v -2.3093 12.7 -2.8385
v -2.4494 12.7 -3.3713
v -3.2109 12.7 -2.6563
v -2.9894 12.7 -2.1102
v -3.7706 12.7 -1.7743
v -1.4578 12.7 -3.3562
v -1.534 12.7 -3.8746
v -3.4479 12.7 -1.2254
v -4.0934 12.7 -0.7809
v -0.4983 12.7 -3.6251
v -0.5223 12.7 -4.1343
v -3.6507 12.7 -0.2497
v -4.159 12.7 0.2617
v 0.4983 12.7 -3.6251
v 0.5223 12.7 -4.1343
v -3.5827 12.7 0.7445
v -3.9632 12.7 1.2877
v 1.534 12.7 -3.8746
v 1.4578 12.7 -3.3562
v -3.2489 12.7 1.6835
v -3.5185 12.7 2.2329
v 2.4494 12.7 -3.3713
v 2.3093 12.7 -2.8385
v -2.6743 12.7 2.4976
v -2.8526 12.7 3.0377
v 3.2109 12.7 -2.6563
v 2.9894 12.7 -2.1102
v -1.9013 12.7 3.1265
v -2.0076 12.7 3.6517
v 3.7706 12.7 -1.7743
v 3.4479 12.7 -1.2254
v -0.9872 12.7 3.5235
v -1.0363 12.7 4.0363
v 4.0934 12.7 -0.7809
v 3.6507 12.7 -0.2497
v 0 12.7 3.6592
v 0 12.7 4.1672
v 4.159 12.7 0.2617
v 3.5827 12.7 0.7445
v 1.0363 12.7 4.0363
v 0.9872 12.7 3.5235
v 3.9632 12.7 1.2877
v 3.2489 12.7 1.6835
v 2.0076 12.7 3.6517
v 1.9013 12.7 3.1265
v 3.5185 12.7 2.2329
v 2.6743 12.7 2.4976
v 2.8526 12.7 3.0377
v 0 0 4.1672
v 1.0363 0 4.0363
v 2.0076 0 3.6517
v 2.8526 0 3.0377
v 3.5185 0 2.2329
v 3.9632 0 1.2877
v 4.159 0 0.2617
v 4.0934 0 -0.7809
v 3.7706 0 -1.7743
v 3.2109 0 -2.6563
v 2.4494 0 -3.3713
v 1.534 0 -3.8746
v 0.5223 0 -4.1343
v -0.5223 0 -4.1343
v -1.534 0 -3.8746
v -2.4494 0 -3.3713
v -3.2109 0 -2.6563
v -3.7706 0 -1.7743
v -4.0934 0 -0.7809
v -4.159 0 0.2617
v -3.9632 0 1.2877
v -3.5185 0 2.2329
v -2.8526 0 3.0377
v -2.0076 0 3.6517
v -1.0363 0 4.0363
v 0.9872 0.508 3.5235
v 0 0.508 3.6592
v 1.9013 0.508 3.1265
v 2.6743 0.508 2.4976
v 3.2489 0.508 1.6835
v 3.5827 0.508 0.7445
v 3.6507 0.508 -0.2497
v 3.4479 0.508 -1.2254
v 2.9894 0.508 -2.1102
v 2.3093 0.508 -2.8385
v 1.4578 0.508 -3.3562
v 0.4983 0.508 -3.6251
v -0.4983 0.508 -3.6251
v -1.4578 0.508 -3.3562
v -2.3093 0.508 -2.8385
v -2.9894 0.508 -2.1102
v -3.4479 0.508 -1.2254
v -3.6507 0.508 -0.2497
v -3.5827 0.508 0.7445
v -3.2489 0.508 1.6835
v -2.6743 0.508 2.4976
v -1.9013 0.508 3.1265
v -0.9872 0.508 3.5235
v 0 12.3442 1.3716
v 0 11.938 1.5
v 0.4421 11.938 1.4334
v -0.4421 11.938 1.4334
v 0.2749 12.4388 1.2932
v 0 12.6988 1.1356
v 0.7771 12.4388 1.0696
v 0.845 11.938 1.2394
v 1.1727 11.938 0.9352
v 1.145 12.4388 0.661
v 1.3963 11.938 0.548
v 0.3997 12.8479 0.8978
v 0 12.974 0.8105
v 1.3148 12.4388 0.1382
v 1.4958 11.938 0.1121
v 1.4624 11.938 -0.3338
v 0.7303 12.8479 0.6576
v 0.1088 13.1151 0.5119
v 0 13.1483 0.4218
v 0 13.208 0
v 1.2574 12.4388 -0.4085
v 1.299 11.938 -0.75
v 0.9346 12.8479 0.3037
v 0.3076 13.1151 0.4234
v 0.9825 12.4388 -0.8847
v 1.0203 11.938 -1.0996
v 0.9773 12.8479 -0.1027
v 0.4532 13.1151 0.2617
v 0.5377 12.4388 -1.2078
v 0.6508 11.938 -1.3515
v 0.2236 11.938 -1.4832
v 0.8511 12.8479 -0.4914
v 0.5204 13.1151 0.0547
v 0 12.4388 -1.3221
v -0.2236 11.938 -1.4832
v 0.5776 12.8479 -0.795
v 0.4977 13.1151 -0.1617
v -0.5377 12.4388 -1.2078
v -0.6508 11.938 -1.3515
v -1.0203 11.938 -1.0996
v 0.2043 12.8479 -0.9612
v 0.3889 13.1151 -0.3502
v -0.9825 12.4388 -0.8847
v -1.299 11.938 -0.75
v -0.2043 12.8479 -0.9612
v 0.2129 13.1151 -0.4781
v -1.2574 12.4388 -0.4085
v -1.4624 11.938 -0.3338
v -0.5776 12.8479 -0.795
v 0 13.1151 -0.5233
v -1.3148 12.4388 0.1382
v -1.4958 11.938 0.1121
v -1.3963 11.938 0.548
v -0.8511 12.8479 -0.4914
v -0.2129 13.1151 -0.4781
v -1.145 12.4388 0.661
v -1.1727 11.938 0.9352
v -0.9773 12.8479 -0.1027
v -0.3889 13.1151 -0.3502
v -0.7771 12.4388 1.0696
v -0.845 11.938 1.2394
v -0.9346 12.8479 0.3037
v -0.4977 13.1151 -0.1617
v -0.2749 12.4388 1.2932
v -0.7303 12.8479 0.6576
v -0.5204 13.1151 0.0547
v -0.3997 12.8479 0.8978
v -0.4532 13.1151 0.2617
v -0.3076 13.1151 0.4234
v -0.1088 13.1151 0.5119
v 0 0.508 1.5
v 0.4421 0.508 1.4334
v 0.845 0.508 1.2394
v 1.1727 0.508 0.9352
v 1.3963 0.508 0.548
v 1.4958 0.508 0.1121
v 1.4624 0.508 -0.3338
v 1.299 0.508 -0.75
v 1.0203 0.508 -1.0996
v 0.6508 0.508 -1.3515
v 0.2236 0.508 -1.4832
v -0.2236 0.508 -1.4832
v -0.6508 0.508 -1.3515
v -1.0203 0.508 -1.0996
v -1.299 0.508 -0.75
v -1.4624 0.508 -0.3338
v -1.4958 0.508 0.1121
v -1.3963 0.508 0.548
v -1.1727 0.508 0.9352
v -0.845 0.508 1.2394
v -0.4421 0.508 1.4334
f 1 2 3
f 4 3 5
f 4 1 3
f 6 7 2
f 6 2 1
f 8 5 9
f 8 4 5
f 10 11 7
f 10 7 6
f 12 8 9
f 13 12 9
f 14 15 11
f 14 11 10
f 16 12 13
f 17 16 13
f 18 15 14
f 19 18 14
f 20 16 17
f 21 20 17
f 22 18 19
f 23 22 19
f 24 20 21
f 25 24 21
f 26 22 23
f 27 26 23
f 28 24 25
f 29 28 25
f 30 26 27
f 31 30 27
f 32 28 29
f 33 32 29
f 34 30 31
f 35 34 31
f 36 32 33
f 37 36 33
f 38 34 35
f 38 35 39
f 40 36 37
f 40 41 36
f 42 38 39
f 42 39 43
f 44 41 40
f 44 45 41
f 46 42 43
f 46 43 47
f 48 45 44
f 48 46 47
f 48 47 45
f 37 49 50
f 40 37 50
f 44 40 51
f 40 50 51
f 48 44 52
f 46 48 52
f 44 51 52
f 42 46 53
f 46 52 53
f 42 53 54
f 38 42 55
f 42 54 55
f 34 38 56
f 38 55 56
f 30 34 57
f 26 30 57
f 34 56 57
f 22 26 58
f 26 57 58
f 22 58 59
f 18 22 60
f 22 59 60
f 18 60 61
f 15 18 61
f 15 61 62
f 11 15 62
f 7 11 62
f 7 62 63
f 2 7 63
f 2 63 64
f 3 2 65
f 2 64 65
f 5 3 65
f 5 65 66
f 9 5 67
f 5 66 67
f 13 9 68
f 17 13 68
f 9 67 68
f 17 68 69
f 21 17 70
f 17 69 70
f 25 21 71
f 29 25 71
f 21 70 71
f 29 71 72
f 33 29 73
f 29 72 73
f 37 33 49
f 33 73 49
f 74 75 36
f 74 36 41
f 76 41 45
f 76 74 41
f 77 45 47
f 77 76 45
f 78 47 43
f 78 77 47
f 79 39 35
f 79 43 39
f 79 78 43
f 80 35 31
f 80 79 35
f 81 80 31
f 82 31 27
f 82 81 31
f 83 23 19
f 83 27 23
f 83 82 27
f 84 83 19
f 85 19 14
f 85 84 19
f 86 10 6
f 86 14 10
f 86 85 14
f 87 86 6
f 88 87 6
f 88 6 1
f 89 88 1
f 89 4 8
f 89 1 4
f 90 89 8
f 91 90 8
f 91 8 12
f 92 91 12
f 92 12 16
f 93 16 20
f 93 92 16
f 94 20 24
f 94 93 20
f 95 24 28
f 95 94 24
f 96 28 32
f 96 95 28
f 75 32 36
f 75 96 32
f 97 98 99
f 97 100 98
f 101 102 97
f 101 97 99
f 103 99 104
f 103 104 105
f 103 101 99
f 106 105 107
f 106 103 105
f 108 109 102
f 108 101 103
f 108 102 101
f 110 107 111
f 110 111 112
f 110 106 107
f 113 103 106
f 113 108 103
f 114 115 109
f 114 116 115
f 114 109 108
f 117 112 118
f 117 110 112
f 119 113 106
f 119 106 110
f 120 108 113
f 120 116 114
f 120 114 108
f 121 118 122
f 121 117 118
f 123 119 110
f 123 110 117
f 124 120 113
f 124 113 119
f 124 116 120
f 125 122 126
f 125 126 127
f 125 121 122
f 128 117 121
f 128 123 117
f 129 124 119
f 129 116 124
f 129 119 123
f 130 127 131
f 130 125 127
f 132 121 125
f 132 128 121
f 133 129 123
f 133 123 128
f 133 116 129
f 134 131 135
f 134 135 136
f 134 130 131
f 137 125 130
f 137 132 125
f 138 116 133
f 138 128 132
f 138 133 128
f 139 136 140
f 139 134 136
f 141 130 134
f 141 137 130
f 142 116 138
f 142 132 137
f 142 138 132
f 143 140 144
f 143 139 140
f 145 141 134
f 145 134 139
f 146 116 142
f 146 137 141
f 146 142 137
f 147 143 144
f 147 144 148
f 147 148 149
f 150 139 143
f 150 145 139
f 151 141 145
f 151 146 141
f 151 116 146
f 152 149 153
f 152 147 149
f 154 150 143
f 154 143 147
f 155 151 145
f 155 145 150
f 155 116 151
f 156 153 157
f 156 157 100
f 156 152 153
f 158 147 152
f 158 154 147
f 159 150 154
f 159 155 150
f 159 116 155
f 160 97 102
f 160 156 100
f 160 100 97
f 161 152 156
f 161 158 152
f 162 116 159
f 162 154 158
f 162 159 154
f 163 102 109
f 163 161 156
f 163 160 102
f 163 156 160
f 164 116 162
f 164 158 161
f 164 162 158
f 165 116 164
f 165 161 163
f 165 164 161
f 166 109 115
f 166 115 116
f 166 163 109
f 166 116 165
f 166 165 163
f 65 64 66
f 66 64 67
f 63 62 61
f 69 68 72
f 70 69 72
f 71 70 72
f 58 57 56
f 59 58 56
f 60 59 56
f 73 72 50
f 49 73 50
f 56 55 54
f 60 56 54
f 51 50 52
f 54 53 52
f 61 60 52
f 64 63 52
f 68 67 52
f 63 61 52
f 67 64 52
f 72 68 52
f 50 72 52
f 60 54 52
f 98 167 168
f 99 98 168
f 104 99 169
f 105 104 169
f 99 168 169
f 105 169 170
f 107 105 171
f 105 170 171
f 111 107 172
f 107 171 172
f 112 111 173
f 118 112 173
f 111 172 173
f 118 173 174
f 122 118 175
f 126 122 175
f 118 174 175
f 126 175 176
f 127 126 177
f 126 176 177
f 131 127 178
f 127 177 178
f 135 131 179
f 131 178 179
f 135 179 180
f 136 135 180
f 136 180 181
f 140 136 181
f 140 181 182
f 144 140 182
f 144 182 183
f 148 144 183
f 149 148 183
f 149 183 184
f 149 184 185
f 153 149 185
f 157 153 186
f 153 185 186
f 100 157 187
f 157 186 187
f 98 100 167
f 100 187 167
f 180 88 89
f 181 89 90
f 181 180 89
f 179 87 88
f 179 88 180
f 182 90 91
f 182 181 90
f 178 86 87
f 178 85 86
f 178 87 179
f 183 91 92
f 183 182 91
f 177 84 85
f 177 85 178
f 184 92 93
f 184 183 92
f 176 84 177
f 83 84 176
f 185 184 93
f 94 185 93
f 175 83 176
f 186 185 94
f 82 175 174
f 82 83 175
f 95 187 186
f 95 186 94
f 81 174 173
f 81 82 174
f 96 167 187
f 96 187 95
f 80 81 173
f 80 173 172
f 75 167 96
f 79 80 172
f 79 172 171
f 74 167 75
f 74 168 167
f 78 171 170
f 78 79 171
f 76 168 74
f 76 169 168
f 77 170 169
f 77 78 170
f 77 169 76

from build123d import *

# Parameters (mm, degrees)
SKETCH1_R           = 4.1671875
BOSS_EXTRUDE1_DEPTH = 12.7
SHELL1_T            = -0.508
SKETCH2_R           = 1.5
BOSS_EXTRUDE2_DEPTH = 11.43
DOME1_FACE_RADIUS   = 1.5
DOME1_HEIGHT        = 1.27


with BuildPart() as part:
    # Sketch1 → Boss-Extrude1 (new body)
    with BuildSketch(Plane(origin=(0, 0, 0), x_dir=(1, 0, 0), z_dir=(0, 1, 0))):
        with Locations(Location((0, 0, 0), (0, 0, 270))):
            Circle(SKETCH1_R)
    extrude(amount=BOSS_EXTRUDE1_DEPTH)

    # Shell1
    shell1_openings = [part.faces().sort_by_distance(p)[0] for p in [
        (0, 12.7, 0),
    ]]
    offset(amount=SHELL1_T, openings=shell1_openings, kind=Kind.INTERSECTION)

    # Sketch2 → Boss-Extrude2 (add)
    with BuildSketch(Plane(origin=(0, 0.508, 0), x_dir=(1, 0, 0), z_dir=(0, 1, 0))):
        with Locations(Location((0, 0, 0), (0, 0, 270))):
            Circle(SKETCH2_R)
    extrude(amount=BOSS_EXTRUDE2_DEPTH)

    # Dome1: a dome of height H over a round flat face of radius A is a cap of a sphere of radius (A * A + H * H) / (2 * H)
    dome1_r = (DOME1_FACE_RADIUS * DOME1_FACE_RADIUS + DOME1_HEIGHT * DOME1_HEIGHT) / (2 * DOME1_HEIGHT)
    dome1_base = Plane((0, 11.938, 0), z_dir=(0, 1, 0))
    with Locations(dome1_base.offset(DOME1_HEIGHT - dome1_r)):
        dome1_ball = Sphere(dome1_r, mode=Mode.PRIVATE)
    add(split(dome1_ball, bisect_by=dome1_base, keep=Keep.TOP, mode=Mode.PRIVATE))


solid = part.part
